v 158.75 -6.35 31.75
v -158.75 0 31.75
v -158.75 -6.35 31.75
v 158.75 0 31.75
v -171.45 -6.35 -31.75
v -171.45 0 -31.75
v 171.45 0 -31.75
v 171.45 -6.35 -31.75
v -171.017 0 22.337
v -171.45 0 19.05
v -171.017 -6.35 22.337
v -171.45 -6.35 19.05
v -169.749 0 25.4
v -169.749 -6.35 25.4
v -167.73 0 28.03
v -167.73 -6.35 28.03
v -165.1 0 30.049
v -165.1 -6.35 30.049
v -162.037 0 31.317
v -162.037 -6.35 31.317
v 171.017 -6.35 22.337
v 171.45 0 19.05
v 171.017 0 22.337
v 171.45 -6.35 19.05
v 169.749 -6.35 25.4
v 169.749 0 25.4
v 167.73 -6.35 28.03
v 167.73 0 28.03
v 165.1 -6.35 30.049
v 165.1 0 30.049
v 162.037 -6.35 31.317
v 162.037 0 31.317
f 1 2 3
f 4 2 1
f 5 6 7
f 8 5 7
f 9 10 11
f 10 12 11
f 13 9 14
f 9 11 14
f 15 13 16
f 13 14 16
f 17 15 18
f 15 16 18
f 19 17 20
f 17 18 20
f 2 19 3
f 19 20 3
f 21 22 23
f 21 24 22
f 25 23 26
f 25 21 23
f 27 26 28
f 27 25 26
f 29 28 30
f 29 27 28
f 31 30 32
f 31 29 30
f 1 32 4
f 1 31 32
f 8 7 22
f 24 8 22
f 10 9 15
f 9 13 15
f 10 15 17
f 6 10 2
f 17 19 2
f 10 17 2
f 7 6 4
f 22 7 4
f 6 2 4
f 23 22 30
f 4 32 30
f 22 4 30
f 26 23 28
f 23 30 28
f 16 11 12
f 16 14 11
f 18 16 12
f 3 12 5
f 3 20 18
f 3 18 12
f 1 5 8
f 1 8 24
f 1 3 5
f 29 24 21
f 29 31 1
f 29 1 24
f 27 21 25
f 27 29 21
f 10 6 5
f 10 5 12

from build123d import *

# Parameters (mm, degrees)
F0_W     = 342.9
F0_H     = 63.5
F1_DEPTH = 6.35
F2_R     = 12.7


with BuildPart() as f1:
    # F0 (on Front) → F1 (new body)
    with BuildSketch(Plane.XZ):
        Rectangle(F0_W, F0_H)
    extrude(amount=F1_DEPTH)

    # F2
    f2_edges = [f1.edges().sort_by_distance(p)[0] for p in [
        (-171.45, -3.175, 31.75),
        (171.45, -3.175, 31.75),
    ]]
    fillet(f2_edges, radius=F2_R)


solid = f1.part
